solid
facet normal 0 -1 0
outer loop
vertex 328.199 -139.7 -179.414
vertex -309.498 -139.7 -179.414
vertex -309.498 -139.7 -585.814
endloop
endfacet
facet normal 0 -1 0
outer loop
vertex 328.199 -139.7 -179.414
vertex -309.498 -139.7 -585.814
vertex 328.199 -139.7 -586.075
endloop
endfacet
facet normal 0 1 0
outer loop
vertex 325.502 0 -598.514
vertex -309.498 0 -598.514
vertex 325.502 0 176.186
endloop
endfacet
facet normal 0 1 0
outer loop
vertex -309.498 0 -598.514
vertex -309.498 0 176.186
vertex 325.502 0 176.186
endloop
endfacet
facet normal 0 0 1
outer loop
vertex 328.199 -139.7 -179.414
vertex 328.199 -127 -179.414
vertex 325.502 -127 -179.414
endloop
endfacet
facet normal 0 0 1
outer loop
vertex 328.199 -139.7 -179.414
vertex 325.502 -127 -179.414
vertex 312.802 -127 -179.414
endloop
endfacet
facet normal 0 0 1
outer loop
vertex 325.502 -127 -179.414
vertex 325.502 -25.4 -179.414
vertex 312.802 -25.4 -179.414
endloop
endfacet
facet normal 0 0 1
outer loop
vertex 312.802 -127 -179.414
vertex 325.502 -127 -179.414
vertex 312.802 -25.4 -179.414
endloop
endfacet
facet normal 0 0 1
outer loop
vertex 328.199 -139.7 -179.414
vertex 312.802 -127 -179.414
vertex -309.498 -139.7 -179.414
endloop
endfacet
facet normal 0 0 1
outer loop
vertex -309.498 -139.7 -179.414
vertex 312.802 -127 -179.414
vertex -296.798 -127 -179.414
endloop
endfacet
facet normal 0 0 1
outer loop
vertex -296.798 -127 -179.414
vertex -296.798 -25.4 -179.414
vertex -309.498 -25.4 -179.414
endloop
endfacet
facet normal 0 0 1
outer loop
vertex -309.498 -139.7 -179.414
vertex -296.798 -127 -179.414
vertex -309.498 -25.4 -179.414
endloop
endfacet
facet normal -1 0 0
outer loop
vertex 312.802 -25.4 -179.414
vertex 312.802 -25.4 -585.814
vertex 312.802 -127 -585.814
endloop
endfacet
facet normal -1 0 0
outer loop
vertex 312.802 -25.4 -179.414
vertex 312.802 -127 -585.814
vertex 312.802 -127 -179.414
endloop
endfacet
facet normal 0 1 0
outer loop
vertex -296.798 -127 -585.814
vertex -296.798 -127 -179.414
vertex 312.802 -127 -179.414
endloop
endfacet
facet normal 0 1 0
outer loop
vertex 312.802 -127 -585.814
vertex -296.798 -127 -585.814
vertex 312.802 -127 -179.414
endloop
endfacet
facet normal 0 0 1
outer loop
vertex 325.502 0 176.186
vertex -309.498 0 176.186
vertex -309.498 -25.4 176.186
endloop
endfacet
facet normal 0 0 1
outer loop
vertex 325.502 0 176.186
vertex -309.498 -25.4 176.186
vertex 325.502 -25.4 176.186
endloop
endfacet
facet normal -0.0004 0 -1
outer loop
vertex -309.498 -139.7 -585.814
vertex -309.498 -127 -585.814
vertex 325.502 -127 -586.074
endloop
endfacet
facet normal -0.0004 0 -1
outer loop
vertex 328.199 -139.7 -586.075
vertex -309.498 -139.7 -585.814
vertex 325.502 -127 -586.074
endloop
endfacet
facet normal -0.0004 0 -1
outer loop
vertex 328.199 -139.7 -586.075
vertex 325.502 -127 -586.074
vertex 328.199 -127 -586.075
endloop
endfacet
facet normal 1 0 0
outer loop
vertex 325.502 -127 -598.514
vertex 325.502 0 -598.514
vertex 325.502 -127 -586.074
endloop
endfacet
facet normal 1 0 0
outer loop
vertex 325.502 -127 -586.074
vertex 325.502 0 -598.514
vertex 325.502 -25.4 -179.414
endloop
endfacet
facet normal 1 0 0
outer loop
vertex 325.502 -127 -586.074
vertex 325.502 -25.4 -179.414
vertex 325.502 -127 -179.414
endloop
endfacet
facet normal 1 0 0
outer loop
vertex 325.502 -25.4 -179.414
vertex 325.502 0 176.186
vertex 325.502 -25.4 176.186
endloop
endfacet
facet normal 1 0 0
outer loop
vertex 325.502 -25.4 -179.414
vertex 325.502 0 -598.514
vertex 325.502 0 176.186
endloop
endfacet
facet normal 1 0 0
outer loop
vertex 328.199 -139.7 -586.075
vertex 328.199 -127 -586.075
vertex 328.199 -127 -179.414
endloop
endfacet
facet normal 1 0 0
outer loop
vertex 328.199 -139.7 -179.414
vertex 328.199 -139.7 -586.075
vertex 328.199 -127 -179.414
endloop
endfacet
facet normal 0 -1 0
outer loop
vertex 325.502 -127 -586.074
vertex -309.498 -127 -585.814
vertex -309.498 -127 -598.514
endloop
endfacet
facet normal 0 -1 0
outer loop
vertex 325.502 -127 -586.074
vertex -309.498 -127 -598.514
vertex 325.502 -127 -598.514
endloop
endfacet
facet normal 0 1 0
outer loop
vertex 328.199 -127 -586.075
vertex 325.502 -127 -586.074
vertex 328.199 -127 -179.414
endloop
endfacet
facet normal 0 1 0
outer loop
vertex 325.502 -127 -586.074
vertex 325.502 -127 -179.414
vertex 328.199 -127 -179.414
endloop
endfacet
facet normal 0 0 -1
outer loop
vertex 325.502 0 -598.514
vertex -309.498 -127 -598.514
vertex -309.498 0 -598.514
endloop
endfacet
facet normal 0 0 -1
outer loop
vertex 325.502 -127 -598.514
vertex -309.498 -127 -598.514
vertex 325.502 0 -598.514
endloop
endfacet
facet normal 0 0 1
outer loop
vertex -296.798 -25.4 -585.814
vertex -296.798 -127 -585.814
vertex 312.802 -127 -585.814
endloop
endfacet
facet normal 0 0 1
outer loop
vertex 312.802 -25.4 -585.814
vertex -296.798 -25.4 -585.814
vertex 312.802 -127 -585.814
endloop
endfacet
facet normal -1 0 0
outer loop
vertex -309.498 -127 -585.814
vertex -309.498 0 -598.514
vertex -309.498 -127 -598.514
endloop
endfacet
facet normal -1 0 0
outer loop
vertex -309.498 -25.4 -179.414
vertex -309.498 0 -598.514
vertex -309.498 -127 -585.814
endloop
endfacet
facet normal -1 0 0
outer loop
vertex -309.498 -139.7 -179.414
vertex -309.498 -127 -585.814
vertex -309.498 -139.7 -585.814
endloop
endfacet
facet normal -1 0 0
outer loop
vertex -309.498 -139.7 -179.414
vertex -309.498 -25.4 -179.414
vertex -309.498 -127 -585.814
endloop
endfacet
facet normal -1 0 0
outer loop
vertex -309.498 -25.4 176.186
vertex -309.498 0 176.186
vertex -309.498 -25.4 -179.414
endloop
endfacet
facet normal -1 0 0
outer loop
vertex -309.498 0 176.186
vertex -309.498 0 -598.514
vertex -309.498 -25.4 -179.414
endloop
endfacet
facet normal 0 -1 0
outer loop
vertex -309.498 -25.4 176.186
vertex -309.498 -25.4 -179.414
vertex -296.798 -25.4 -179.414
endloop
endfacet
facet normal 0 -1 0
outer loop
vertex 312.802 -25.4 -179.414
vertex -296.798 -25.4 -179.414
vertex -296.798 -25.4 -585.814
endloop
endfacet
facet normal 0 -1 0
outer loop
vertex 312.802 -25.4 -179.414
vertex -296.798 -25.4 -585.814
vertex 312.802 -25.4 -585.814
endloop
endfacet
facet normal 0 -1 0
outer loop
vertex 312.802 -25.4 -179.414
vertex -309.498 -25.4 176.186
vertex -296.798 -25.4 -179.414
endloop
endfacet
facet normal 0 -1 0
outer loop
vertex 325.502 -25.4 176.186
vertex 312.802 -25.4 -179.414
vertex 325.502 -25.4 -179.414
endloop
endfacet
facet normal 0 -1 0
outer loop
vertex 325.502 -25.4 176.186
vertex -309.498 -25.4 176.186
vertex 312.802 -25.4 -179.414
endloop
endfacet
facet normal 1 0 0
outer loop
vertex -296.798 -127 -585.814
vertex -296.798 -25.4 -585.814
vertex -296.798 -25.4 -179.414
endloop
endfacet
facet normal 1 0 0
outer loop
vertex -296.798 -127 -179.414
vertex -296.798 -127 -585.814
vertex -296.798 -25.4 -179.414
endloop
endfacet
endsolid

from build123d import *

# Parameters (mm, degrees)
F0_W      = 635
F0_H      = 762
F1_DEPTH  = 12.7
F1_FACE_W = 635
F1_FACE_H = 762
F2_DEPTH  = 12.7
F3_W      = 12.7
F3_H      = 406.4
F4_DEPTH  = 101.6
F5_W      = 12.7
F5_H      = 406.4
F6_DEPTH  = 101.6
F8_DEPTH  = 12.7
F9_W      = 635
F9_H      = 127
F10_DEPTH = 12.7


with BuildPart() as f1:
    # F0 (on Front) → F1 (new body)
    with BuildSketch(Plane.XZ):
        with Locations((8.002397, -204.813847)):
            Rectangle(F0_W, F0_H)
    extrude(amount=F1_DEPTH)

    # F1_face (on face) → F2 (join)
    with BuildSketch(Plane(origin=(8.002397, -12.7, -204.813847), x_dir=(1, 0, 0), z_dir=(0, -1, 0))):
        Rectangle(F1_FACE_W, F1_FACE_H)
    extrude(amount=F2_DEPTH)

    # F3 (on face) → F4 (join)
    with BuildSketch(Plane.XZ.offset(25.4)):
        with Locations((-303.147603, -382.613847)):
            Rectangle(F3_W, F3_H)
    extrude(amount=F4_DEPTH)

    # F5 (on face) → F6 (join)
    with BuildSketch(Plane.XZ.offset(25.4)):
        with Locations((319.152397, -382.613847)):
            Rectangle(F5_W, F5_H)
    extrude(amount=F6_DEPTH)

    # F7 (on face) → F8 (join)
    with BuildSketch(Plane.XZ.offset(127)):
        Polygon((328.198969, -179.413847), (-309.497603, -179.413847), (-309.497603, -585.813847), (328.198969, -586.074769), align=None)
    extrude(amount=F8_DEPTH)

    # F9 (on face) → F10 (join)
    with BuildSketch(Plane(origin=(0, 0, -585.813847), x_dir=(1, 0, 0), z_dir=(0, 0, -1))):
        with Locations((8.002397, 63.5)):
            Rectangle(F9_W, F9_H)
    extrude(amount=F10_DEPTH)


solid = f1.part
